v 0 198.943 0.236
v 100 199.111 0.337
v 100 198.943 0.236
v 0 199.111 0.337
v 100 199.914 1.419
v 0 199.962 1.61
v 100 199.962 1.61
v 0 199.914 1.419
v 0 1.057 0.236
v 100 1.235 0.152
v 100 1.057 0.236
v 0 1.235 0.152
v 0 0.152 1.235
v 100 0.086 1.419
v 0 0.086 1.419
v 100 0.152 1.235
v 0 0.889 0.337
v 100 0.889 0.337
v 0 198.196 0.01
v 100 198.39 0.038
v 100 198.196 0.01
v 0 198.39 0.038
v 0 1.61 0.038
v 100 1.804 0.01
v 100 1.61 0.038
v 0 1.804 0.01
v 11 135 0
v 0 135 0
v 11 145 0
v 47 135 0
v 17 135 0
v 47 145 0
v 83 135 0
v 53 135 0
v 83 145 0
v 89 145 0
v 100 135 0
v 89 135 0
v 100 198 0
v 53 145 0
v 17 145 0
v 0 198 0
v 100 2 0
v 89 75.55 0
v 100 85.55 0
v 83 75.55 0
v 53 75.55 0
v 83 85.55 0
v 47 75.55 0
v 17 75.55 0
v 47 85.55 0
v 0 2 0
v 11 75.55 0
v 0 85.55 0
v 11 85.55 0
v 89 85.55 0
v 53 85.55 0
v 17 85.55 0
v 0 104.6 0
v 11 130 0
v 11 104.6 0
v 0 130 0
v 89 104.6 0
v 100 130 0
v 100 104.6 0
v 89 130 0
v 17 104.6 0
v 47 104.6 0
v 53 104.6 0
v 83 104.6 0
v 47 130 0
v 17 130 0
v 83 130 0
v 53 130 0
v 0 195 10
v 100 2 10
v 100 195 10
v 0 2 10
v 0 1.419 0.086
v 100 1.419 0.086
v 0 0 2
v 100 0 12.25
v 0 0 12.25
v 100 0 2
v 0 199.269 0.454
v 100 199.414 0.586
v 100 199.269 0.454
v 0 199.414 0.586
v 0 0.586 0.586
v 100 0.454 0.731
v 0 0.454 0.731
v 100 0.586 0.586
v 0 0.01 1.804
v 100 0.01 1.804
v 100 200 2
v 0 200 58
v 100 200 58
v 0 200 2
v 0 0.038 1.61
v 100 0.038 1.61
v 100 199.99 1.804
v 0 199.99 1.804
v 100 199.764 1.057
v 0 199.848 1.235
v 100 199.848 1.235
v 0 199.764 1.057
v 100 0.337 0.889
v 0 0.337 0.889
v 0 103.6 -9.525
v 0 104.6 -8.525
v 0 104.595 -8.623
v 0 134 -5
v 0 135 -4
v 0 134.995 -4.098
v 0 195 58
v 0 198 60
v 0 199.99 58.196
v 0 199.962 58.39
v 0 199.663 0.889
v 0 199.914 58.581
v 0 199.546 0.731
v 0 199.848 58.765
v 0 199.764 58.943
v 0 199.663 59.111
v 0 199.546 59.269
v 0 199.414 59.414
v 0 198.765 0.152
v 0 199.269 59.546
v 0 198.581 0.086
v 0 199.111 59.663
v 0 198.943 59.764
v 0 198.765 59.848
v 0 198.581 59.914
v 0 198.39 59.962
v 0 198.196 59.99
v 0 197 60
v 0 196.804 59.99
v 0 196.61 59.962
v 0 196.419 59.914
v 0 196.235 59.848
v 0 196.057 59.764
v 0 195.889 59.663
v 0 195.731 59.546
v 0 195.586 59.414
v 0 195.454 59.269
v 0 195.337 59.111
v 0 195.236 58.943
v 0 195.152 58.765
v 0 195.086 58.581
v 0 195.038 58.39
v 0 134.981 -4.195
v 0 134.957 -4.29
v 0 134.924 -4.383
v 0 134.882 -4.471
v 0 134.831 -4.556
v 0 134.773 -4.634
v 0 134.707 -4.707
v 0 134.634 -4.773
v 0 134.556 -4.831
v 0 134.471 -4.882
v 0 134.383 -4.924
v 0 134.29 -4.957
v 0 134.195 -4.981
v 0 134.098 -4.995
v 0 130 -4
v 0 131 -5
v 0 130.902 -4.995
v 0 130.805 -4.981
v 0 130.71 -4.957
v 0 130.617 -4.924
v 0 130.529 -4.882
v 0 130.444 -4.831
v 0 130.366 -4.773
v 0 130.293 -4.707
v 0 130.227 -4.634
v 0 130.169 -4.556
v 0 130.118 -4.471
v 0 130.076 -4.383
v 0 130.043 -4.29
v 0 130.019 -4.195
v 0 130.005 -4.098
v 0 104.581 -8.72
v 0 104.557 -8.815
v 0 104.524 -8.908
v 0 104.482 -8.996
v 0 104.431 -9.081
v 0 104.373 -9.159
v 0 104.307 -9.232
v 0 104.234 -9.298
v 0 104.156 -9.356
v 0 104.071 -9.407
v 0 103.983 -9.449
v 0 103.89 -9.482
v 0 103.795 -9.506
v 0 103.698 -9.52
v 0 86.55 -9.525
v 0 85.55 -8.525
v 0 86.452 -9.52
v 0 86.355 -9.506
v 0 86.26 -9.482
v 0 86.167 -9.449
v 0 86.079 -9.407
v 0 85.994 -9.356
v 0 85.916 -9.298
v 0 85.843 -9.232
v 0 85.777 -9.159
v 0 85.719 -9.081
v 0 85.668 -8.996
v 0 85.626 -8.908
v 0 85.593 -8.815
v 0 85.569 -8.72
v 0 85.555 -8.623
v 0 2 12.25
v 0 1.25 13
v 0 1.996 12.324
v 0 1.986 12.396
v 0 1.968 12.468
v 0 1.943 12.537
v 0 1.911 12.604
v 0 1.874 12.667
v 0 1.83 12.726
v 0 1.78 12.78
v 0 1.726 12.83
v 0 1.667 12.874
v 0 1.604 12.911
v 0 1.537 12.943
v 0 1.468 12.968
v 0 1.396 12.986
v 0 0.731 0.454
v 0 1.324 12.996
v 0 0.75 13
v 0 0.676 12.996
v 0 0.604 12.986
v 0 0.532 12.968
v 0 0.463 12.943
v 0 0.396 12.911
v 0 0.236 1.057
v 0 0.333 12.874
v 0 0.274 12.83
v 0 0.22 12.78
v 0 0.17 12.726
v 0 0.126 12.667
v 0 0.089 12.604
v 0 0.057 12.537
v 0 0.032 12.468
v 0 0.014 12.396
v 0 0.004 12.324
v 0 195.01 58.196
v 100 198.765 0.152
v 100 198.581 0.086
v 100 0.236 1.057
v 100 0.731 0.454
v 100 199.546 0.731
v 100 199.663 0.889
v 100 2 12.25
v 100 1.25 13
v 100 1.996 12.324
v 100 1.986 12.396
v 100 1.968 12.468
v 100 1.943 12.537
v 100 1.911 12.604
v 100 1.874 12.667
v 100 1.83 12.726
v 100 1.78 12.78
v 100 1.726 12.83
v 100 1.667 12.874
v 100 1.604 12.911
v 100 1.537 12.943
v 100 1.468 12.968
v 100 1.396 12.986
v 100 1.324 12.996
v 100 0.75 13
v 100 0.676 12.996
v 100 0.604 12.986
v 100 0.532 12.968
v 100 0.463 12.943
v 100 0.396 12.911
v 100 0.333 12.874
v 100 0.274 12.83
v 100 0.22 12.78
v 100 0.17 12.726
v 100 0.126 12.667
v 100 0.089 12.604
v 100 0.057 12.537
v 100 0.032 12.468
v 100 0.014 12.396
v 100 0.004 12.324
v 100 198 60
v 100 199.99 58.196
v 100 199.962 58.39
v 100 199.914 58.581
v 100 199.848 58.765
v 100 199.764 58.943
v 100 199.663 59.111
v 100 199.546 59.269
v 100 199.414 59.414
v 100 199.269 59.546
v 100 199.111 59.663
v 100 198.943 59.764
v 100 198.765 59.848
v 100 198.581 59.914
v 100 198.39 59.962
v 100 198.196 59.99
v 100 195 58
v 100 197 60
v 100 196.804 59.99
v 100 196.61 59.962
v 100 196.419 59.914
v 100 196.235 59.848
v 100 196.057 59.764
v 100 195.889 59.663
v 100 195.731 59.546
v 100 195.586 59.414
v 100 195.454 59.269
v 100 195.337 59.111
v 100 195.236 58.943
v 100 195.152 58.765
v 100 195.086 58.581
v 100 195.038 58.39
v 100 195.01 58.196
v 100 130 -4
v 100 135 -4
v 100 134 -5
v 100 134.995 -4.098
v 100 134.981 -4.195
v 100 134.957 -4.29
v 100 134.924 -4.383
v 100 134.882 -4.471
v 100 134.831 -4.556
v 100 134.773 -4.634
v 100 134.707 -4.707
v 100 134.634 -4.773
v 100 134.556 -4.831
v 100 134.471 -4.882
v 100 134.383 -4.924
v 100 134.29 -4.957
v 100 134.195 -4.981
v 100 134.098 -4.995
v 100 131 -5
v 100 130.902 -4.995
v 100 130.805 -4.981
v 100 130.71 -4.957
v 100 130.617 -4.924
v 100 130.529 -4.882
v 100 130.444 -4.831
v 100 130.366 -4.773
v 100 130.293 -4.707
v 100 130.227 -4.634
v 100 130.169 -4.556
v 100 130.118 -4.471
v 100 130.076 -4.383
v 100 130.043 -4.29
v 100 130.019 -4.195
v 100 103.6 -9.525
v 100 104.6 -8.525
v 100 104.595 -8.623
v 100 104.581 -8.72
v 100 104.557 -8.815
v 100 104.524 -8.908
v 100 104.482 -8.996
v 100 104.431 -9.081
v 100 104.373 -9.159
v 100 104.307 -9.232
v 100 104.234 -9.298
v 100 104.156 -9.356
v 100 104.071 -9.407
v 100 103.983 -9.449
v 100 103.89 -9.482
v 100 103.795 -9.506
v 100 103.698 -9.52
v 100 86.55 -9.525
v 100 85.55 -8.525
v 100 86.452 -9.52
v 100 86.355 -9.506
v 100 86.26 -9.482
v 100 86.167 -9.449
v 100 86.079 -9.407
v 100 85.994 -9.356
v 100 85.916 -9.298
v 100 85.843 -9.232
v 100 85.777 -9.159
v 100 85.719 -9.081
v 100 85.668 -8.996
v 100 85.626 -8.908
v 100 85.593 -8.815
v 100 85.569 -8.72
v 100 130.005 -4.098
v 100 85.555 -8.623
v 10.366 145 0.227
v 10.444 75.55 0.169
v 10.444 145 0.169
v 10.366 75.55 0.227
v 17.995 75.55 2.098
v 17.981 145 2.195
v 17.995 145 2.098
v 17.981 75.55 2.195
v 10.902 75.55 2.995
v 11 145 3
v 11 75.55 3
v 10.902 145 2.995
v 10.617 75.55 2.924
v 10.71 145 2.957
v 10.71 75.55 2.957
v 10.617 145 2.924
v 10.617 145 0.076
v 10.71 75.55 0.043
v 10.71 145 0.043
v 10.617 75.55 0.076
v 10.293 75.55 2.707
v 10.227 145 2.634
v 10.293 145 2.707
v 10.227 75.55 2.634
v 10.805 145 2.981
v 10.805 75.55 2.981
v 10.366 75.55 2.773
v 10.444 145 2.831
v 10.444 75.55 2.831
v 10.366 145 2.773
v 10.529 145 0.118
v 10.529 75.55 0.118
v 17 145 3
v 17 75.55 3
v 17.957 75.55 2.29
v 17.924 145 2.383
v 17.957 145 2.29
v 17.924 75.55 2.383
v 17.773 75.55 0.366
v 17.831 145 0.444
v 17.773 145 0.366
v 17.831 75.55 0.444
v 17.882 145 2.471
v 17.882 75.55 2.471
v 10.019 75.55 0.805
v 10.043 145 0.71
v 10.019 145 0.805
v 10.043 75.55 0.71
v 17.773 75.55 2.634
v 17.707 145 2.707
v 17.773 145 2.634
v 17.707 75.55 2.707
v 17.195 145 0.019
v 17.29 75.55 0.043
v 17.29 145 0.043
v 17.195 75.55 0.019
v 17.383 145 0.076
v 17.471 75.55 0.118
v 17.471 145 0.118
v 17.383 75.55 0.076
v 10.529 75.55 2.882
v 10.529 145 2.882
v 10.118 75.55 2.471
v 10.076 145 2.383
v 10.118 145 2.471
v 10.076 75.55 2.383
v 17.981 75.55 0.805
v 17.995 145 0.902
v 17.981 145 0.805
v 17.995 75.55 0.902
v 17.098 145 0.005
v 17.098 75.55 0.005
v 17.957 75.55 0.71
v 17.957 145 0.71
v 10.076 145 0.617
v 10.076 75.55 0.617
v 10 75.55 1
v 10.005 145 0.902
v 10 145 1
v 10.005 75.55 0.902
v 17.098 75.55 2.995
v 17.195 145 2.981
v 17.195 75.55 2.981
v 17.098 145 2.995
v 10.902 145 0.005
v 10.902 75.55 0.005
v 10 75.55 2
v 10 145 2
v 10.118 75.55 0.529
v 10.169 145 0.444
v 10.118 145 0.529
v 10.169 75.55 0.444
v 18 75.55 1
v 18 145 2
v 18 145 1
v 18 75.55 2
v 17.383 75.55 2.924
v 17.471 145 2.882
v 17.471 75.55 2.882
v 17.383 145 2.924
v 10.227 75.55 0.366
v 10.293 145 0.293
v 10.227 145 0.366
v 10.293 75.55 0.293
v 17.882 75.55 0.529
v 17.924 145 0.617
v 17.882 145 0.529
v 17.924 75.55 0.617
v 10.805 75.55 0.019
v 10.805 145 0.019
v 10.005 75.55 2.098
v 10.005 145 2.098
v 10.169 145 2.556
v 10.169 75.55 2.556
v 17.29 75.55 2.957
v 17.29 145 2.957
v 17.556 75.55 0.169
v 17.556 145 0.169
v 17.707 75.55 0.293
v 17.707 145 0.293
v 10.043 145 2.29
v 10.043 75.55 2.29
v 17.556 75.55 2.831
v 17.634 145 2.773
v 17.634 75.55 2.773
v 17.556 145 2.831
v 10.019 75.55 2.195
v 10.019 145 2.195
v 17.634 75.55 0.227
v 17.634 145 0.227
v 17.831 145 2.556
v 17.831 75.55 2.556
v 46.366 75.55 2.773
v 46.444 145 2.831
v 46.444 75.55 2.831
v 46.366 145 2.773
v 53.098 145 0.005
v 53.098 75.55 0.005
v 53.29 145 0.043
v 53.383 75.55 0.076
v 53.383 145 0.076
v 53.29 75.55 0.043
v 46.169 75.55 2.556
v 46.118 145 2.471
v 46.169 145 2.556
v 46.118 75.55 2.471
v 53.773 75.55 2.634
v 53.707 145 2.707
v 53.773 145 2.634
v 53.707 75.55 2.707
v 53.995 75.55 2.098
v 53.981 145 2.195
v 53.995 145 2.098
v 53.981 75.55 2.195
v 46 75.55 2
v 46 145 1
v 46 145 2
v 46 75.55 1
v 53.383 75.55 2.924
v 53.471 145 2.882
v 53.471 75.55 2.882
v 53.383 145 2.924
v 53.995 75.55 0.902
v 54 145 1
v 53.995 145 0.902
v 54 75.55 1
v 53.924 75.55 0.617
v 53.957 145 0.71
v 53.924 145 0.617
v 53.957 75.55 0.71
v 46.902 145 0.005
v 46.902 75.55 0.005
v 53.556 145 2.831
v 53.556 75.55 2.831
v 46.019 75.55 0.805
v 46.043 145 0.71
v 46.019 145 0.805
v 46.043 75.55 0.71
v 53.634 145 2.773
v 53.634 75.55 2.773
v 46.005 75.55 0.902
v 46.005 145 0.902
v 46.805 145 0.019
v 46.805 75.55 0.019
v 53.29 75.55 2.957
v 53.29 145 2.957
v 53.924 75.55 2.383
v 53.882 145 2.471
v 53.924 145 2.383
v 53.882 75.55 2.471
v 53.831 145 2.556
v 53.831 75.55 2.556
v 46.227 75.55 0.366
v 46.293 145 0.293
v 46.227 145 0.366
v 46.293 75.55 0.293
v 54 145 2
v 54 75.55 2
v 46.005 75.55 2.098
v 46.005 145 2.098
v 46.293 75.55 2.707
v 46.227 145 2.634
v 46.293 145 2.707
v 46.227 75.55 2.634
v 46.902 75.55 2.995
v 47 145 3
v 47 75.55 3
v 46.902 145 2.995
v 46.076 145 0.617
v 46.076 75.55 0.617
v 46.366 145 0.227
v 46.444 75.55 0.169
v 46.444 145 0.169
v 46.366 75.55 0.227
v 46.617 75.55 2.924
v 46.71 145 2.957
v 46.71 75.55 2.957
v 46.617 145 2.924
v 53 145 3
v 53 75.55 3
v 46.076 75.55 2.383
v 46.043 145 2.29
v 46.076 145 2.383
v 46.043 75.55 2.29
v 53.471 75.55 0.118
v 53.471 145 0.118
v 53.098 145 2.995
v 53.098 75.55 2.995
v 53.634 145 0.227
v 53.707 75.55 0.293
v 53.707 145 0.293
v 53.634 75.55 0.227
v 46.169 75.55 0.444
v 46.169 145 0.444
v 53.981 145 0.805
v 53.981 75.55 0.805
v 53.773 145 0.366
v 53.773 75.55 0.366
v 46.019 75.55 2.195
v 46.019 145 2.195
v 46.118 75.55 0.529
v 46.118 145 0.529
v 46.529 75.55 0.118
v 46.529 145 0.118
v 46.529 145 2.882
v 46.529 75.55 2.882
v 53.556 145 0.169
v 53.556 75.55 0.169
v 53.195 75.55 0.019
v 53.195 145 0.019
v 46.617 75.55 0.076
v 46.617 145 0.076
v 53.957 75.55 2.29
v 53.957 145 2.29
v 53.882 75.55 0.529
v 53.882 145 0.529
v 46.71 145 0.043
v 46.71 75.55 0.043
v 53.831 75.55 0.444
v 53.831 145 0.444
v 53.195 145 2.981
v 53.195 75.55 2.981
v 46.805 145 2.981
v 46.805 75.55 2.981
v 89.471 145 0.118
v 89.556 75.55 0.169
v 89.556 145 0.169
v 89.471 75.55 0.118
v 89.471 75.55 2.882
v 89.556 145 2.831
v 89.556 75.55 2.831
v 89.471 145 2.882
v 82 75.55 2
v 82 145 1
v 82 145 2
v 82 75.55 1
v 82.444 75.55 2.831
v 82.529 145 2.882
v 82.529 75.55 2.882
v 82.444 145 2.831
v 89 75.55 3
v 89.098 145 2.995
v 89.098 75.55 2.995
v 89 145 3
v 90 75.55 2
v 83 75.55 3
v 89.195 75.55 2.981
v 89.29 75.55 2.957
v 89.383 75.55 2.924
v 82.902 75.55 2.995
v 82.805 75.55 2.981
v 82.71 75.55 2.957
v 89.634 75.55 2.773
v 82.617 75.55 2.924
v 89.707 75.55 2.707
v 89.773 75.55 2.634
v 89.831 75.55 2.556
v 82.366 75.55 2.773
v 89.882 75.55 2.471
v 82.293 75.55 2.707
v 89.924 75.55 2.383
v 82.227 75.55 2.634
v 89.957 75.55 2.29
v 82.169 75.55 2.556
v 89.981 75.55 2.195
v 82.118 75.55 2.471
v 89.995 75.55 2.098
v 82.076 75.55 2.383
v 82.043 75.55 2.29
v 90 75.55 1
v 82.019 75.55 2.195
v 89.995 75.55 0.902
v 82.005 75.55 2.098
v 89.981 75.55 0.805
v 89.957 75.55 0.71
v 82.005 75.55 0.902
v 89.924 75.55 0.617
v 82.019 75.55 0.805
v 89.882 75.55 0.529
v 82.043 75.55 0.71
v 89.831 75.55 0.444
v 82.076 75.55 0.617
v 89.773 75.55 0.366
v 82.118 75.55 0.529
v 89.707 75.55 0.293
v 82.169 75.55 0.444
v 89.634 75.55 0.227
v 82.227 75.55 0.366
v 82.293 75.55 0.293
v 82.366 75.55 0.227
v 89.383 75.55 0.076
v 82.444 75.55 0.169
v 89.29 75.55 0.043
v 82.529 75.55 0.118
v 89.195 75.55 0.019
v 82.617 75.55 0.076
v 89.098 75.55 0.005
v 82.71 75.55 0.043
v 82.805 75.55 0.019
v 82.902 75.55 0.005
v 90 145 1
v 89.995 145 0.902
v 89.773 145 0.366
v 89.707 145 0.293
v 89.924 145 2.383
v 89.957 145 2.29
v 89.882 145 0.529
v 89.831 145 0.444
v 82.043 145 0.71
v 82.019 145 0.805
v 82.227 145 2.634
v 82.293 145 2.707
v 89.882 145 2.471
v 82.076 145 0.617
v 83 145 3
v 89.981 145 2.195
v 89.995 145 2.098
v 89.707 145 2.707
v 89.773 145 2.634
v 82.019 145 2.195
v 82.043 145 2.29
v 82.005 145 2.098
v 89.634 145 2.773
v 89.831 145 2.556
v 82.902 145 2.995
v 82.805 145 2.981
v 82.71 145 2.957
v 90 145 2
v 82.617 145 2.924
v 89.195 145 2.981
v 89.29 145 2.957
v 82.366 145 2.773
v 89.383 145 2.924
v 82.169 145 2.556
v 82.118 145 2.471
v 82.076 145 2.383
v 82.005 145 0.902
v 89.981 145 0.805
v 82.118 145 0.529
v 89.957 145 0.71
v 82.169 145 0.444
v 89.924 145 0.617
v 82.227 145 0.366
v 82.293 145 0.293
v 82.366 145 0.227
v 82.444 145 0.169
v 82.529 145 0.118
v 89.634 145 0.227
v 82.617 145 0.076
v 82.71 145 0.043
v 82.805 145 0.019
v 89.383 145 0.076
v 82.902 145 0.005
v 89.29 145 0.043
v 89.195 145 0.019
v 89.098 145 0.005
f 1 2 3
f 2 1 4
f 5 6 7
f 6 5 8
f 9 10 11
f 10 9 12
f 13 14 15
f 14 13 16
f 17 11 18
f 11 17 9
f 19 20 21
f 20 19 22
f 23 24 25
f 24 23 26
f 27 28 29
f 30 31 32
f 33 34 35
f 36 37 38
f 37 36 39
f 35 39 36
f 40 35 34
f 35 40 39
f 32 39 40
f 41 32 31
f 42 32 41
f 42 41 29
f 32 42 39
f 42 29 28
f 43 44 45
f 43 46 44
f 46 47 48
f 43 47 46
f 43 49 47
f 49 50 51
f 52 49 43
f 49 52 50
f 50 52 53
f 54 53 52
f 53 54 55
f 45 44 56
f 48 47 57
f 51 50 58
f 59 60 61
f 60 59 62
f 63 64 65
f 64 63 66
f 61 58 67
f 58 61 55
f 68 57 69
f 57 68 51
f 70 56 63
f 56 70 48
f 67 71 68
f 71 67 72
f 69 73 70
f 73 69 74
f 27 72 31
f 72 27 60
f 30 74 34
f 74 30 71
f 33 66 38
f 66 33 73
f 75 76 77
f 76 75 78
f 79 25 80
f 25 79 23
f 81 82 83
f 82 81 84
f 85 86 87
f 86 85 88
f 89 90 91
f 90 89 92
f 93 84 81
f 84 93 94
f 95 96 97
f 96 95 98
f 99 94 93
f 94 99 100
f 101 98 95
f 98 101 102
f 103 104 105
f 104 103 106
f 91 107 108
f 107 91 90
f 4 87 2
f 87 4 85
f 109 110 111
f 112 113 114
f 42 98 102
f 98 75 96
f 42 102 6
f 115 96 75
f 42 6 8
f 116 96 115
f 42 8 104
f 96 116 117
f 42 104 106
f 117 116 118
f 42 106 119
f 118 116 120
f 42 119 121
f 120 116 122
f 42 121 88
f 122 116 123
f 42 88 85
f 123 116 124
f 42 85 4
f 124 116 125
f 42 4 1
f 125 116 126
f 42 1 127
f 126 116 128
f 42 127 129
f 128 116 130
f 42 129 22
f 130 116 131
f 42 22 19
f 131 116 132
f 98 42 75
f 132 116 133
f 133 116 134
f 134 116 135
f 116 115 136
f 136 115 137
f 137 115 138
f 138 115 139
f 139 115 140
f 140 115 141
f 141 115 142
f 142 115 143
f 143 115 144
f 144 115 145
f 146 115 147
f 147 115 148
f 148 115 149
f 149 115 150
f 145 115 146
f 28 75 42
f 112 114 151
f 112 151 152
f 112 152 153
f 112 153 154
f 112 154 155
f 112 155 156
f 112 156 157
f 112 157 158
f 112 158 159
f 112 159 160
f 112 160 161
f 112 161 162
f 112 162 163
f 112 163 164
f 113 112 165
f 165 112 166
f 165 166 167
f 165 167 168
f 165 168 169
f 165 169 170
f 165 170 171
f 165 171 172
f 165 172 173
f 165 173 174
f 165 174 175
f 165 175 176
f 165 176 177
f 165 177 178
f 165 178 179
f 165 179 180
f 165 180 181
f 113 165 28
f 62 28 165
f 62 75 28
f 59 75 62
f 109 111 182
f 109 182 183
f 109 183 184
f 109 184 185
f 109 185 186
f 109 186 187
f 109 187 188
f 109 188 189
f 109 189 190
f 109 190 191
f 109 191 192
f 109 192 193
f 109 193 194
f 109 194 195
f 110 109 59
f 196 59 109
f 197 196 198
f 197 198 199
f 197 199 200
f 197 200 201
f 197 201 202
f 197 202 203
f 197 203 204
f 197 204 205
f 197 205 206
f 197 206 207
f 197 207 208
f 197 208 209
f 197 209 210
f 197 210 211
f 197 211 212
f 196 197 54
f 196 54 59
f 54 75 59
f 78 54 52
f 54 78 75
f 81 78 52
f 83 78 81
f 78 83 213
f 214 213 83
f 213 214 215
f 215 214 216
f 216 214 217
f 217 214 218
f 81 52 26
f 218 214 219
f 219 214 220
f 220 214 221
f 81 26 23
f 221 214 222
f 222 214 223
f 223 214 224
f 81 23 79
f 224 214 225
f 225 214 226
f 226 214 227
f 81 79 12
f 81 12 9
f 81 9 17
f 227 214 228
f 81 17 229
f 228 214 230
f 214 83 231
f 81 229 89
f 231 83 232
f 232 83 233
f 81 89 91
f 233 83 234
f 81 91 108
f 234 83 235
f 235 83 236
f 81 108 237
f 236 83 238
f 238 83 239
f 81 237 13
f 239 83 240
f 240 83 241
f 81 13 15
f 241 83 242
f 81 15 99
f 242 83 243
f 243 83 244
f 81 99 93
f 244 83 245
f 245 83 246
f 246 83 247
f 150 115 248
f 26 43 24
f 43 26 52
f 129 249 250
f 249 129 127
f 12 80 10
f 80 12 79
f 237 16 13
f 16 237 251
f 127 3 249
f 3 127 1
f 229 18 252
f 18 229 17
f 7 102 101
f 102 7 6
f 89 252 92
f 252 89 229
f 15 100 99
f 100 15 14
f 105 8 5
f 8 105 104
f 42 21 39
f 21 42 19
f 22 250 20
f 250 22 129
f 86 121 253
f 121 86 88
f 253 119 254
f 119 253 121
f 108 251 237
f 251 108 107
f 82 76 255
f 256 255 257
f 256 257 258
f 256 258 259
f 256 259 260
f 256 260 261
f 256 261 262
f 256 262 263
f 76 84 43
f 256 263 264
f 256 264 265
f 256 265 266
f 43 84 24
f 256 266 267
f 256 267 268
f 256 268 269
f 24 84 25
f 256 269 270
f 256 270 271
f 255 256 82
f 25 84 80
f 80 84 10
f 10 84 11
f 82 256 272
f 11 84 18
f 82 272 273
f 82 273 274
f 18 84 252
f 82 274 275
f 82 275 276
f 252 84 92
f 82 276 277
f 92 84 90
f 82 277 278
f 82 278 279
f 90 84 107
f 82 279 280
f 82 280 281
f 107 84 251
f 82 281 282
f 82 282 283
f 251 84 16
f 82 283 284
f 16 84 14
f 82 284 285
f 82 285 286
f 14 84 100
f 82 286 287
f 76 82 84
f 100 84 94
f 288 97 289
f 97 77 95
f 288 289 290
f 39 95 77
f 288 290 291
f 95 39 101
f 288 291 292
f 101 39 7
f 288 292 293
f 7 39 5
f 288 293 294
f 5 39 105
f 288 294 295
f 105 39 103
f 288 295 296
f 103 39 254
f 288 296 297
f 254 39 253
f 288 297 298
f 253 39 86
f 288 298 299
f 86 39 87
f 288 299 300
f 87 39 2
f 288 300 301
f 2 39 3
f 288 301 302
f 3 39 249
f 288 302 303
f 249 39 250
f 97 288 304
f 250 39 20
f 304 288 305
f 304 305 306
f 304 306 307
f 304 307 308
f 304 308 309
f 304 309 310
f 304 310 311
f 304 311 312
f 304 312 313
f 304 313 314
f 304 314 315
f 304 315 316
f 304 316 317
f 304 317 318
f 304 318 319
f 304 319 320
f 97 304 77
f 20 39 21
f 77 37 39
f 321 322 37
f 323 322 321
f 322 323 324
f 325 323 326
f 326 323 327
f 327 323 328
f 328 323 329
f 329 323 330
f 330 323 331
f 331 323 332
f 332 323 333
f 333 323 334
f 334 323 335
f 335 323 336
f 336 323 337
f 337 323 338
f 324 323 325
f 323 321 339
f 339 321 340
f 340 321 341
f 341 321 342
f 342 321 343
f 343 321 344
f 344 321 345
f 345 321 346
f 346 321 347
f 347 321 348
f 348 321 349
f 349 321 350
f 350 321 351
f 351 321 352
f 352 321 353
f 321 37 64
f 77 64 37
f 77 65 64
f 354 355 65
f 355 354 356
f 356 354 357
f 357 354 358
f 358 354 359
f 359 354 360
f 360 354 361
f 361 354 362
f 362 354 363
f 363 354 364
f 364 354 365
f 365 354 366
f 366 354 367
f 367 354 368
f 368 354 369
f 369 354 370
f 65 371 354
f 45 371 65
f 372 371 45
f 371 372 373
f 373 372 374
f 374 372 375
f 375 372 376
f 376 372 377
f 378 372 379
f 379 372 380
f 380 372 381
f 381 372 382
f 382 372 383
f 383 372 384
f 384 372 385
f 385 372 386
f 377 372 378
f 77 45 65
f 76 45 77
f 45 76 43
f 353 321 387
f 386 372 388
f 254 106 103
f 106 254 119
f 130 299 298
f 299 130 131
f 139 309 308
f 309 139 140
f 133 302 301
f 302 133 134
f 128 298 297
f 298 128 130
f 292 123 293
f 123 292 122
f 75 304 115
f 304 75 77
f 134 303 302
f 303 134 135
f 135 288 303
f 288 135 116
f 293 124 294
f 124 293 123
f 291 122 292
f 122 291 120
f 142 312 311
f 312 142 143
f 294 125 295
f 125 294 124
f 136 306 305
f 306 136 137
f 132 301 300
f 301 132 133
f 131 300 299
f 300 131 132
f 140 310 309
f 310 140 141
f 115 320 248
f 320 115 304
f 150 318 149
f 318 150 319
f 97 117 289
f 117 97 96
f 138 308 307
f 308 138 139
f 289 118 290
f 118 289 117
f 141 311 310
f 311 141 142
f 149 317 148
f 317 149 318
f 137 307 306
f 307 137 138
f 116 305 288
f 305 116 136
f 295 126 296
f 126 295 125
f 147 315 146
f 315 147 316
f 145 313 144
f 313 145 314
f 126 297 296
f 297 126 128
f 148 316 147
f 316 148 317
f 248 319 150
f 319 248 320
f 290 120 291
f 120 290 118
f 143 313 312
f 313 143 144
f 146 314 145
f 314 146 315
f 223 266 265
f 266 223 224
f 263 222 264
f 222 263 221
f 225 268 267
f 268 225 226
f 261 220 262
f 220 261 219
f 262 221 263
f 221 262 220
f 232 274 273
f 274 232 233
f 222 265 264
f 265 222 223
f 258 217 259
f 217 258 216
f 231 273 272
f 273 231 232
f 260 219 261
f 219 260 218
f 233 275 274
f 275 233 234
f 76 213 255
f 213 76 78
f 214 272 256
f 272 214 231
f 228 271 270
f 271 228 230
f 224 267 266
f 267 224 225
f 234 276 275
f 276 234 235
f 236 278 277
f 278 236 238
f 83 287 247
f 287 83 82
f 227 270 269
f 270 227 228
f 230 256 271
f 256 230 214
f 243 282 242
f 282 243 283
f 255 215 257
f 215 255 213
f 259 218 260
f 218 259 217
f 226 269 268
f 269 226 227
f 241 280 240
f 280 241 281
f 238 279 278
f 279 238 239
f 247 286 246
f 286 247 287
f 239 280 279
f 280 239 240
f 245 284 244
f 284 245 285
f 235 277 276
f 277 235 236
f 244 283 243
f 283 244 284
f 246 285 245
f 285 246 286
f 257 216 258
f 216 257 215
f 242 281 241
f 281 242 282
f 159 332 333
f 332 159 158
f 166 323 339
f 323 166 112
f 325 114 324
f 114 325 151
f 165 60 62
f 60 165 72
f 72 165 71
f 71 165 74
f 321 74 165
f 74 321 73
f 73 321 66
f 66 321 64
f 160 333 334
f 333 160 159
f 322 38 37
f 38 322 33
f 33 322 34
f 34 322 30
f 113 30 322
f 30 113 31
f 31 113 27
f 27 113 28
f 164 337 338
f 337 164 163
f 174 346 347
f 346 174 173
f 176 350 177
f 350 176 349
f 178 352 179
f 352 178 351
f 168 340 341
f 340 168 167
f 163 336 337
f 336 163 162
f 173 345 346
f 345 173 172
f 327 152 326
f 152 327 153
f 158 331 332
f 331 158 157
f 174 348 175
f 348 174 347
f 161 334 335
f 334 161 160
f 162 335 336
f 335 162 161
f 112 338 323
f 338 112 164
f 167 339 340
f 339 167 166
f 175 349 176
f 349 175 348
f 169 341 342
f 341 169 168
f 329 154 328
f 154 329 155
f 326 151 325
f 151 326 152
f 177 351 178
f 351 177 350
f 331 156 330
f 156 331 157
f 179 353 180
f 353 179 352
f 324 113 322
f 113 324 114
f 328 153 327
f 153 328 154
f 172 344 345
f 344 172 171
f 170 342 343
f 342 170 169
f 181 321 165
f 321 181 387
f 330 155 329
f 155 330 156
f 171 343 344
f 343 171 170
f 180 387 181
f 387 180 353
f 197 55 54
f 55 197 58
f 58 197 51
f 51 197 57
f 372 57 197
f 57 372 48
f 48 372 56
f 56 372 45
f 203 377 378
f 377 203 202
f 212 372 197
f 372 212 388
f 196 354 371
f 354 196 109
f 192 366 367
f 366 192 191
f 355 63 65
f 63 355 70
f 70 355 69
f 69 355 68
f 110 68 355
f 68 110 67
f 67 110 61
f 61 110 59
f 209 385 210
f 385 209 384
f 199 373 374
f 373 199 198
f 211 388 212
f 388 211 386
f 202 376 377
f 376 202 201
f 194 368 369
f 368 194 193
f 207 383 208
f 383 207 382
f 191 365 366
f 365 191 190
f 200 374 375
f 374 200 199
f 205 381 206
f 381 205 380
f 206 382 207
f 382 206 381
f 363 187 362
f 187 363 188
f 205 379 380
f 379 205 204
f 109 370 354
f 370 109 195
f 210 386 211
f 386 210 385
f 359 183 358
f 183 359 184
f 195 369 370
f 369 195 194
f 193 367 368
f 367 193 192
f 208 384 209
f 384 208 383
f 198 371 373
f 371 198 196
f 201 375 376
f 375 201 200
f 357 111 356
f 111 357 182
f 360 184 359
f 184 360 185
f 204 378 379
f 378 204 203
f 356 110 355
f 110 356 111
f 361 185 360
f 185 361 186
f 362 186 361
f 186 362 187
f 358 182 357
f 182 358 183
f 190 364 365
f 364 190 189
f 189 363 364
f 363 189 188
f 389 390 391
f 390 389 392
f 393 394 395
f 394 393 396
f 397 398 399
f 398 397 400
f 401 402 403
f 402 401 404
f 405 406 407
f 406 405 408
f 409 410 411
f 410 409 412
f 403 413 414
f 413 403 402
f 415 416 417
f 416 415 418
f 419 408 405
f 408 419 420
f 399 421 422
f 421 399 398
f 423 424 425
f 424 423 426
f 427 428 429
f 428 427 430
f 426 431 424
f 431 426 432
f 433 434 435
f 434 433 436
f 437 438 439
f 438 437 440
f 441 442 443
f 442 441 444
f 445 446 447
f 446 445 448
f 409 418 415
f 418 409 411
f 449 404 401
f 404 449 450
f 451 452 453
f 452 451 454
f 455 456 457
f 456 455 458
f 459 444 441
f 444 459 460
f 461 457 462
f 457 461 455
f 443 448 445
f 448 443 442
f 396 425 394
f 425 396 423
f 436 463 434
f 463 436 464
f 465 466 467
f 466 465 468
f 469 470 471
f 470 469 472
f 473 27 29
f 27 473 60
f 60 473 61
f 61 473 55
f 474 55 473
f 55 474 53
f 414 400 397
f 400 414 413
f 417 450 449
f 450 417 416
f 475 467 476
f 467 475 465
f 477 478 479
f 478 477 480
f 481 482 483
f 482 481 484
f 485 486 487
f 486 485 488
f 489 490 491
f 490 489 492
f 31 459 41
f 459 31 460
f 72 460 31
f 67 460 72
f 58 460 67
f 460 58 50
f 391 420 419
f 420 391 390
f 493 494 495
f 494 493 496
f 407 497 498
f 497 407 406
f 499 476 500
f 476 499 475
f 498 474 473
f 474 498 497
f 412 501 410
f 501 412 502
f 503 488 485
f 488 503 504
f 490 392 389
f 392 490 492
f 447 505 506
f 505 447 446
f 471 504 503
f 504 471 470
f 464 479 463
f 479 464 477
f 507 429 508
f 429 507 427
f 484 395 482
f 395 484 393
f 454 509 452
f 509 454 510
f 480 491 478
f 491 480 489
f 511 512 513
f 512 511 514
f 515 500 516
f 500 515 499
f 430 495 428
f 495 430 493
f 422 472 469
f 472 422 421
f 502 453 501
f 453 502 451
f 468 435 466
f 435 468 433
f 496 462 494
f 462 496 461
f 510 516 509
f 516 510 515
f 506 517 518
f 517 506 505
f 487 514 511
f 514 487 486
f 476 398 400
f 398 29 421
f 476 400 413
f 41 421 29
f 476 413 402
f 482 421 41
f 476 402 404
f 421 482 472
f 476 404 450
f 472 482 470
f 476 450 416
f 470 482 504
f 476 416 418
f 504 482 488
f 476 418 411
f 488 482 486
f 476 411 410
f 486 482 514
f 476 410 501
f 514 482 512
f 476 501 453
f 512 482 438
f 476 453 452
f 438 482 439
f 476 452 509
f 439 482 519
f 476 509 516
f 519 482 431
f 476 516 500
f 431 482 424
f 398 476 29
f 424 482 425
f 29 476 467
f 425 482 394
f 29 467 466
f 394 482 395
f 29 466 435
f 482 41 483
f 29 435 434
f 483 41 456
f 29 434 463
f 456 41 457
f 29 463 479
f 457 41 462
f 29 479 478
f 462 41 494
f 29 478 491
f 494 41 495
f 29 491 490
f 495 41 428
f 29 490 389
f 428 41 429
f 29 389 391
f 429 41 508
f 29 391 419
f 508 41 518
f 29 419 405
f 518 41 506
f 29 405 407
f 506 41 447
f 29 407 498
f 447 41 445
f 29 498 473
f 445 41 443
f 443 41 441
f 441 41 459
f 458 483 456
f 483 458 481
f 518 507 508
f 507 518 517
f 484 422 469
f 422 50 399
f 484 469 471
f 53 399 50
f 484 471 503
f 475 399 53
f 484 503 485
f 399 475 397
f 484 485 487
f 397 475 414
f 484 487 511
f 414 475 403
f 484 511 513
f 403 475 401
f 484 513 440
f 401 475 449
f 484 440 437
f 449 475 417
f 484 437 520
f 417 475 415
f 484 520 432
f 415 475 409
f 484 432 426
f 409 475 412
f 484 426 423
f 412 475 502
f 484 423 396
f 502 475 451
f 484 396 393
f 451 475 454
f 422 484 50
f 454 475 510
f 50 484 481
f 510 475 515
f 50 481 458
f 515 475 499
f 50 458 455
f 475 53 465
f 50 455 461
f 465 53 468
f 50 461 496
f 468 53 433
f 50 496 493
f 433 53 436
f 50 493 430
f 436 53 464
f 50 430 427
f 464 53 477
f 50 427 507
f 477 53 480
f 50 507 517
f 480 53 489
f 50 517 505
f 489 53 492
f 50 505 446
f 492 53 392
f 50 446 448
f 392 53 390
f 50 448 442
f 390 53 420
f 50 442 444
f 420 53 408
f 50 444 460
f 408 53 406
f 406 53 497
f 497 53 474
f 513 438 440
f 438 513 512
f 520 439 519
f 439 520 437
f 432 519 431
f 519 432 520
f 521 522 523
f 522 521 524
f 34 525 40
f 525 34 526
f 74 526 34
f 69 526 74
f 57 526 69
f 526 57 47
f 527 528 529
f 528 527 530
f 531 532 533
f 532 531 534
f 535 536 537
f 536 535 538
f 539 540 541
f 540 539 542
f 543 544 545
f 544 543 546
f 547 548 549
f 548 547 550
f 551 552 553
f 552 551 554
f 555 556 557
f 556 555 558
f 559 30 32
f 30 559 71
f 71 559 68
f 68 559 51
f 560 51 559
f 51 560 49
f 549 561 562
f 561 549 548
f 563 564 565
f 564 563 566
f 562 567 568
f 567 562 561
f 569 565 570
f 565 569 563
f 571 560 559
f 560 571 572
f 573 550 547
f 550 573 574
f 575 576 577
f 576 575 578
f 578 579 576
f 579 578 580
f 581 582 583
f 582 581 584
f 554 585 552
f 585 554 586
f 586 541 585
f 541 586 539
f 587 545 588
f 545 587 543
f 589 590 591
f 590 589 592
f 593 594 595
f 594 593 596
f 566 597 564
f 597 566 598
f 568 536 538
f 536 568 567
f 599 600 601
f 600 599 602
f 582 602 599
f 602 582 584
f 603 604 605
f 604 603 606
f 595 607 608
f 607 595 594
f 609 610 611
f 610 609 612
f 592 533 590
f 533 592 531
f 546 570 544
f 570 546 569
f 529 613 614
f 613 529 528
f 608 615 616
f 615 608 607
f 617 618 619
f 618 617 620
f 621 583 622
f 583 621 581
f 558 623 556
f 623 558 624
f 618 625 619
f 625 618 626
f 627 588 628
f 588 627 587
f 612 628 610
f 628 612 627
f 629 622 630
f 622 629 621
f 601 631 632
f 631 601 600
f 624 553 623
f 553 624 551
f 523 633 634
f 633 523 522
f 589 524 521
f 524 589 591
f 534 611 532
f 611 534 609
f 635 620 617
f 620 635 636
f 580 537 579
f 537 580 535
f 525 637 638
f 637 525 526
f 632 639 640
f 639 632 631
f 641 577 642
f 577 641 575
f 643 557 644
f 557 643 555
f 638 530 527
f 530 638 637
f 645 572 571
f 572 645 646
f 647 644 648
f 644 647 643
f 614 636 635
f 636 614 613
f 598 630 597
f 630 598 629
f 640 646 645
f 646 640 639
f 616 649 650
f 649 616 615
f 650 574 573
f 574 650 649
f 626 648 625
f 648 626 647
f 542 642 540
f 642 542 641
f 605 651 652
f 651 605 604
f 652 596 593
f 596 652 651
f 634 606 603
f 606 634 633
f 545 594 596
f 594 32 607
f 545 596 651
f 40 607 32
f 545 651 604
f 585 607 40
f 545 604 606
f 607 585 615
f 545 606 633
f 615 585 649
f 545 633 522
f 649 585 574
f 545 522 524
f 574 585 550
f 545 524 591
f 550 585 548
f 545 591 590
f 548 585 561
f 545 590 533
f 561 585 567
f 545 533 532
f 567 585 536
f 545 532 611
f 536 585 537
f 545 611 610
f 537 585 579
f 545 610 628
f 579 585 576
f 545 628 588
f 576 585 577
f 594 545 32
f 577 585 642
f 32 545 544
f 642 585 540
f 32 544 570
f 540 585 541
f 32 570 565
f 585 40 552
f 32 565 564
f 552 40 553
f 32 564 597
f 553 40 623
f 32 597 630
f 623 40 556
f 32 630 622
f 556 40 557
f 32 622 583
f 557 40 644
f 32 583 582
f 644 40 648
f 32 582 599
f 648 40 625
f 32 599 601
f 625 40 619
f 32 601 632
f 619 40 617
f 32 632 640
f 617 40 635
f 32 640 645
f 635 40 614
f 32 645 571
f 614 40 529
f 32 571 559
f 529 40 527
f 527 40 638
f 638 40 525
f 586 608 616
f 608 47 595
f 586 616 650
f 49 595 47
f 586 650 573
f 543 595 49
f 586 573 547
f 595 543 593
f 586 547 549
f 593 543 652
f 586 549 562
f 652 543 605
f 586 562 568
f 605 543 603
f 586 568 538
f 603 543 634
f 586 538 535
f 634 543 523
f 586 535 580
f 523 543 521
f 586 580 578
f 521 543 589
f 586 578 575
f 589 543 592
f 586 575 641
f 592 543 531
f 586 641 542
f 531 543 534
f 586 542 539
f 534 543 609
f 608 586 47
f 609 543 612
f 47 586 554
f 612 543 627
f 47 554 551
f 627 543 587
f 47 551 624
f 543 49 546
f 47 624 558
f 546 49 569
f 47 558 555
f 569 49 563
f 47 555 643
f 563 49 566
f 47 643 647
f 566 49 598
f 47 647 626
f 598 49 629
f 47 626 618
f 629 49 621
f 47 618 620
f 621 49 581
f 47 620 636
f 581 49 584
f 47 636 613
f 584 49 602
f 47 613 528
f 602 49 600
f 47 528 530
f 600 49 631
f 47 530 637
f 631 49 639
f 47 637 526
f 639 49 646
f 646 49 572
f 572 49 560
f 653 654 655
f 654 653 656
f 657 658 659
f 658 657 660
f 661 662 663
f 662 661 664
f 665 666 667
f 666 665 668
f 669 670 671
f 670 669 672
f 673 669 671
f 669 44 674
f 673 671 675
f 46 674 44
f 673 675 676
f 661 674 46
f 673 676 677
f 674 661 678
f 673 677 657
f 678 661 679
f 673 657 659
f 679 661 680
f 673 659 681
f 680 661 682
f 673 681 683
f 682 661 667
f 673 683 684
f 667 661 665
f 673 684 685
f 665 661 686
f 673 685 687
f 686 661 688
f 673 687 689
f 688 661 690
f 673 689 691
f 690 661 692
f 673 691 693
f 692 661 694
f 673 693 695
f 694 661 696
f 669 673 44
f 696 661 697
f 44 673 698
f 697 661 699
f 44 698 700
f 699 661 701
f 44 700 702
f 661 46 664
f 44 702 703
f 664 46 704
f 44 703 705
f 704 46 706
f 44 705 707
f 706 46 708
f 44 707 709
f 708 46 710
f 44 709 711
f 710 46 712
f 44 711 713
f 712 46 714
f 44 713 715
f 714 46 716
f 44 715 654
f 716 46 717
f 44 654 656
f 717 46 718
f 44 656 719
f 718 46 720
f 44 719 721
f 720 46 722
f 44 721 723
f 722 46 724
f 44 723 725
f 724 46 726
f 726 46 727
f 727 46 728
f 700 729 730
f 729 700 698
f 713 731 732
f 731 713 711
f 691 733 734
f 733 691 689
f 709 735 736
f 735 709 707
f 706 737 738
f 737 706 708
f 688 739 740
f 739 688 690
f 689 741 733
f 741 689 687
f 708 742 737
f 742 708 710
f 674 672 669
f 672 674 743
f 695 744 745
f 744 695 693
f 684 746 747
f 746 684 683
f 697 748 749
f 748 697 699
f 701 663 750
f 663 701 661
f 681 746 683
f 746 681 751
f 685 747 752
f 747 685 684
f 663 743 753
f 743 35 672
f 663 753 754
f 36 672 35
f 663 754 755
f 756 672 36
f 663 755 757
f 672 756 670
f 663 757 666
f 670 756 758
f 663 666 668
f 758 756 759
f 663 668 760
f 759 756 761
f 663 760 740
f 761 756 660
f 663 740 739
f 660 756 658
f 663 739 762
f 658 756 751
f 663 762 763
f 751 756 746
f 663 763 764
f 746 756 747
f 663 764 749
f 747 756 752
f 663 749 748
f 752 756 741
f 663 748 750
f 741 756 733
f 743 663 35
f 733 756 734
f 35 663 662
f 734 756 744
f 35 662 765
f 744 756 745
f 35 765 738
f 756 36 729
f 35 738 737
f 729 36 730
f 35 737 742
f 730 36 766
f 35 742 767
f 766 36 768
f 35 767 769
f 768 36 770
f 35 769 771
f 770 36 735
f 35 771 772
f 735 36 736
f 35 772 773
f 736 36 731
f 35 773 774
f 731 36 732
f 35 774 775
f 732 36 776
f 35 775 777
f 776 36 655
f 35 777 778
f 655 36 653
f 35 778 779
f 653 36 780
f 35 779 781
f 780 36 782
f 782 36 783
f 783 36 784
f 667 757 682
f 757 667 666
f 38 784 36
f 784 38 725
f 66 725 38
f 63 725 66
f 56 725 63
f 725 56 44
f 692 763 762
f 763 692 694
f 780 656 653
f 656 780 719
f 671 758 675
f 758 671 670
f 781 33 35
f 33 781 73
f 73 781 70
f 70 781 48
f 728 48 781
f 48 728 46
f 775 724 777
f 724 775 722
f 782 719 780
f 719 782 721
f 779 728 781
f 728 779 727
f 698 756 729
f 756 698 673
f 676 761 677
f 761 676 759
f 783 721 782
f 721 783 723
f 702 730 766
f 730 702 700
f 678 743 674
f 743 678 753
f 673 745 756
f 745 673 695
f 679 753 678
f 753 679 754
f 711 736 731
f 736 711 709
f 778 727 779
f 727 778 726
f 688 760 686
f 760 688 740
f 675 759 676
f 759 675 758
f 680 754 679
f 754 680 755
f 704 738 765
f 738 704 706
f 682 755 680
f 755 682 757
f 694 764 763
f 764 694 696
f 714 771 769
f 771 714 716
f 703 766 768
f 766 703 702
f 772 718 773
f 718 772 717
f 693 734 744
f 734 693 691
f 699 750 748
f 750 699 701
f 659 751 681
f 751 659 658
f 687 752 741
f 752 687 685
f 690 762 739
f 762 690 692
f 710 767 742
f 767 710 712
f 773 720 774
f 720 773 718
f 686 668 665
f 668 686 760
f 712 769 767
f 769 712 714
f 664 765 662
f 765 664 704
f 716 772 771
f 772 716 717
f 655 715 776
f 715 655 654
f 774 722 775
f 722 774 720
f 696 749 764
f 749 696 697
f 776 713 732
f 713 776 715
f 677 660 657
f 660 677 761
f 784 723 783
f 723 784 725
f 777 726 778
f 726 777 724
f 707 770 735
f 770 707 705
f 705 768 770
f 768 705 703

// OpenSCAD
// file: 72-inch-cosco-profile.scad
// 72-inch Cosco shelf profile.
//
// Overrides the bar / front-lip dimensions in bar_shelf.scad to fit a
// 72-inch Cosco shelving rail. Include this BEFORE bar_shelf.scad in any
// wrapper that should use the Cosco profile.
border_ridge_override     = 25.4;    // 1"
border_depth_override     = 19.05;   // 3/4"
border_height_override    = 9.525;   // 3/8"
rear_wall_height_override = 5;       // shorter rear lip than 77-inch industrial
// main file
// 100mm-wide x 200mm-deep 72-inch Cosco shelf — see bar_shelf.scad for the design.
include <72-inch-cosco-profile.scad>
shelf_width_override = 100;
shelf_depth_override = 200;
include <bar_shelf.scad>
